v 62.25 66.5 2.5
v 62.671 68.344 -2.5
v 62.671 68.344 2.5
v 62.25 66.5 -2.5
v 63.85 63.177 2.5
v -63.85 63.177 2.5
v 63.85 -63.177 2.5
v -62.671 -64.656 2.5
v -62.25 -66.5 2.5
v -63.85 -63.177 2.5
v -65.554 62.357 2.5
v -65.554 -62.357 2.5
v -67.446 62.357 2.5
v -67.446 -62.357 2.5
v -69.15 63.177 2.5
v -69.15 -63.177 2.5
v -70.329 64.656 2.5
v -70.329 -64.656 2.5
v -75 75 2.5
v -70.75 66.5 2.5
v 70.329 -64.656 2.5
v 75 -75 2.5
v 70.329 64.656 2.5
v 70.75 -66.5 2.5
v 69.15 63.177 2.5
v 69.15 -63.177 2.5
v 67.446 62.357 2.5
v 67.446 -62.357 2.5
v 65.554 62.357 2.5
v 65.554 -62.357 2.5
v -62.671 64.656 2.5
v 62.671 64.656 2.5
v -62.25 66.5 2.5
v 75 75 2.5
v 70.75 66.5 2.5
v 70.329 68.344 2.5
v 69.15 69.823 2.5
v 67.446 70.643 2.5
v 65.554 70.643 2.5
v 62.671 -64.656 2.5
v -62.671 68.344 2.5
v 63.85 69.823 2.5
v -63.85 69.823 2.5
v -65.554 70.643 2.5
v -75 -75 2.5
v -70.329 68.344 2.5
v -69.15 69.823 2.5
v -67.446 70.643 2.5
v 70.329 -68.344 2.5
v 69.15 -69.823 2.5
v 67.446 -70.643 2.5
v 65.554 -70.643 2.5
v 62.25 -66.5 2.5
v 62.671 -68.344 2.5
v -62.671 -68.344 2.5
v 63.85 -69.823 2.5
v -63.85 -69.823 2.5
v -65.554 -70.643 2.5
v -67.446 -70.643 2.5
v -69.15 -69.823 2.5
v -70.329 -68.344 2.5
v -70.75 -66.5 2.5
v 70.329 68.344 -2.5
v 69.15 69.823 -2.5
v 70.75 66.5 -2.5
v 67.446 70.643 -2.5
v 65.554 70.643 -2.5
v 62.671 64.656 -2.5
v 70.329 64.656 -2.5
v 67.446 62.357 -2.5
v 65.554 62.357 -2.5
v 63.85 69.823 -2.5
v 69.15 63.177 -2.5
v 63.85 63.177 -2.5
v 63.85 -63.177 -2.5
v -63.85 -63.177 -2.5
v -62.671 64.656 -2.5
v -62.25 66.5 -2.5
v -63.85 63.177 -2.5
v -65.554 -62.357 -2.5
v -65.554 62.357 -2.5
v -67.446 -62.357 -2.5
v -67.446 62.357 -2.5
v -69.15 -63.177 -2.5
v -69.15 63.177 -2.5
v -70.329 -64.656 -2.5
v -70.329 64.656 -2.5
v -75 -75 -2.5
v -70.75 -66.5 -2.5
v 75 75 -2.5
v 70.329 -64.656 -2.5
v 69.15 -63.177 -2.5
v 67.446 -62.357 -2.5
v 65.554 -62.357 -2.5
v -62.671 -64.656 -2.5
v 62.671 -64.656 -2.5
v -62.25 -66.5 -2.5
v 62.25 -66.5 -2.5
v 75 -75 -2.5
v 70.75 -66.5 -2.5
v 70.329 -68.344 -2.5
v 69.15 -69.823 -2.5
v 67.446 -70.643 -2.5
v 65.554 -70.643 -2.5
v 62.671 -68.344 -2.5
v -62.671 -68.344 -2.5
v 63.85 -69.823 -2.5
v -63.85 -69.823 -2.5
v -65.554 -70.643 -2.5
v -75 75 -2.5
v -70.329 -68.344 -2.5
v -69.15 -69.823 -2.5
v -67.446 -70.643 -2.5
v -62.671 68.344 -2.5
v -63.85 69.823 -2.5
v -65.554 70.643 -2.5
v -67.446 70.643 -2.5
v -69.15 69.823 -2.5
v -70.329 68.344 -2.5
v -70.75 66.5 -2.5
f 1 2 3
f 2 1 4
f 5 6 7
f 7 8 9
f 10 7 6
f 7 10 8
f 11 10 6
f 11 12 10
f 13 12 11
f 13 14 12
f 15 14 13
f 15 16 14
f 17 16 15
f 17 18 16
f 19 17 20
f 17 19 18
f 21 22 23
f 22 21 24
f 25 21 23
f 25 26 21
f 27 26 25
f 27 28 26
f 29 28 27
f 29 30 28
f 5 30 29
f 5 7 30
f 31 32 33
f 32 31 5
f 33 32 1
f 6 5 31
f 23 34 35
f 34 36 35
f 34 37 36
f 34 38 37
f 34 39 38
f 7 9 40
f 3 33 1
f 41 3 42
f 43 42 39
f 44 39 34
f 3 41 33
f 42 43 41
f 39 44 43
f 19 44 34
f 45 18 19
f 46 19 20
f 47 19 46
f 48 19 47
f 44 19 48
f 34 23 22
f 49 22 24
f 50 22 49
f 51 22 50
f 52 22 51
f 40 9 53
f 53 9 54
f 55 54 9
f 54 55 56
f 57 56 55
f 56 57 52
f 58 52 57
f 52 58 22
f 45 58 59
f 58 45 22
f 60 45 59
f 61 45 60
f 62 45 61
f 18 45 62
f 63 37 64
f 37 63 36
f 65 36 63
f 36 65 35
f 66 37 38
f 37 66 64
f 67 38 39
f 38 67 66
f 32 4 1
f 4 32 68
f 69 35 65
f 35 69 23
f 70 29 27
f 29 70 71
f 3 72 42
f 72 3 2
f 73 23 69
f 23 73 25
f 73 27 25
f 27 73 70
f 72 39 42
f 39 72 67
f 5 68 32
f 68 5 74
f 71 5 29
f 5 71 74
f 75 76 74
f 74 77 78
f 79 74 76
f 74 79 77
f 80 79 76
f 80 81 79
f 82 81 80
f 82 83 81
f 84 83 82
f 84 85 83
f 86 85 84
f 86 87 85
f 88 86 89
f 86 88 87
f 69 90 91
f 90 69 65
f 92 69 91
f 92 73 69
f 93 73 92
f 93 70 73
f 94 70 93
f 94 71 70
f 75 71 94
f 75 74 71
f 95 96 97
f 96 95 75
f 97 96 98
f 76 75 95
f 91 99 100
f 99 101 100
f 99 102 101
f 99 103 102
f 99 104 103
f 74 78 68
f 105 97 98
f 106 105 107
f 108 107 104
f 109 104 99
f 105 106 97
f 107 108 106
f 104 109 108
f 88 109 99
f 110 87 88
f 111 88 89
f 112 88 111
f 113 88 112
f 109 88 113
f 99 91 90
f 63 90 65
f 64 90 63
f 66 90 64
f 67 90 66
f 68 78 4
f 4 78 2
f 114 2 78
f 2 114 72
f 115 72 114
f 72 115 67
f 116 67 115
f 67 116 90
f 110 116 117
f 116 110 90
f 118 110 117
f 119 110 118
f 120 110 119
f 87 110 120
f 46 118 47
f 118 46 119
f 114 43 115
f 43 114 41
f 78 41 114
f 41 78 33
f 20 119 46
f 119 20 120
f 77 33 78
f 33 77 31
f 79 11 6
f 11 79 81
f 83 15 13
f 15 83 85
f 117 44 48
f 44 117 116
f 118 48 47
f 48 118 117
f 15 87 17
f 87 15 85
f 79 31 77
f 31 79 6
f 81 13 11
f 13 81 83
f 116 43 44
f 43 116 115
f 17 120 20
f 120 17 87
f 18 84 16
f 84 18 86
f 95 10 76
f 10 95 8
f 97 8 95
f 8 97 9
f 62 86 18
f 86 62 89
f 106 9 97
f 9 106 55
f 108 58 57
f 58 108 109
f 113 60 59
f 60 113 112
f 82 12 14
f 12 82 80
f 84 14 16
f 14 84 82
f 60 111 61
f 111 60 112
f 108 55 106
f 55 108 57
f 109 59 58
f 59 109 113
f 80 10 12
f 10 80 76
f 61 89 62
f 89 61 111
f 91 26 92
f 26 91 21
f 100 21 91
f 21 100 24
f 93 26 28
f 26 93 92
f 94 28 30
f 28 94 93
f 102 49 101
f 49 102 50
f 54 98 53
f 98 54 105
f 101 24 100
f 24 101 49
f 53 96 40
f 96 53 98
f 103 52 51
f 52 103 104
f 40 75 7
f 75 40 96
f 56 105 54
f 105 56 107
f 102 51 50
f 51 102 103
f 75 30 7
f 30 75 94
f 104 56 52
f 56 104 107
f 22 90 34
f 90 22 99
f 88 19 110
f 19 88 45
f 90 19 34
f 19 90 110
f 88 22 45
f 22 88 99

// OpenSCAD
// Generated by SolidPython 1.1.3 on 2024-01-09 11:18:42


difference() {
	cube(center = true, size = [150, 150, 5]);
	union() {
		translate(v = [66.5000000000, 66.5000000000]) {
			cylinder(center = true, h = 5, r = 4.2500000000);
		}
		translate(v = [-66.5000000000, 66.5000000000]) {
			cylinder(center = true, h = 5, r = 4.2500000000);
		}
		translate(v = [-66.5000000000, -66.5000000000]) {
			cylinder(center = true, h = 5, r = 4.2500000000);
		}
		translate(v = [66.5000000000, -66.5000000000]) {
			cylinder(center = true, h = 5, r = 4.2500000000);
		}
	}
}
/***********************************************
*********      SolidPython code:      **********
************************************************
 
import solid
import numpy as np
import numbers
import pudb
from solid.utils import *
import viewscad
import subprocess
import os
import os.path as osp
import math
import sys

chamfer_extrude=solid.import_scad("./chamfer_extrude.scad")
chamfer_extrude=chamfer_extrude.chamfer_extrude
r = viewscad.Renderer(width=800, height=800)

def debug(model,f_name,path="/home/ts/code/projects/mfd/designs/debug"):
    solid.scad_render_to_file(model,osp.join(path,f_name)+".scad")
#generate position list of wells using offset from center
wells_pos_from_center_4 = lambda offset: [[-offset,offset],
                                        [offset, offset],
                                        [-offset, -offset],
                                        [offset, -offset]]
wells_pos_from_center_2 = lambda offset: [[offset,0],
                                        [-offset,0]]

def make_well(dims,shape=None,height=None,dxf=False):
    def circle_cylinder():
        if dxf or (height is None):
            well = solid.circle(r=dims, segments=64)
        else:
            well = solid.cylinder(r=dims, h=height, segments=64, center = True)
        return well
    if dims is None:
        sys.exit("radius needs to be a number")
    if isinstance(dims, numbers.Number):
        well =circle_cylinder()
    elif len(dims)==1:
        if isinstance(dims[1], numbers.Number):
            well =circle_cylinder()
        else:
            sys.exit("radius needs to be a number")
    elif len(dims)==2:
        well = solid.square(dims,center = True)
    elif len(dims)==3:
        well = solid.cube(dims, center = True)
    return well

def wells_top_bottom(center_gap,device_dims=None,shape=None,height=None, positions = None, dxf = False,well_shape=None):
    if well_shape == None:
        well_shape = make_well(device_dims,shape=shape,height=height,dxf=dxf)
    wells = []
    if positions is None:
        offset = radius+radius/2.0
        positions = wells_pos_from_center_2(offset)
    if dxf or (height is None):
        height = 0
    for position in positions:
        if dxf:
            wells.append(solid.translate([position[0],position[1]])(well_shape))
        else:
            wells.append(solid.translate([position[0],position[1],height/2.0])(well_shape))
    return  union()(*wells)

#place wells in four corners 
def four_corner(radius,height=None, positions = None, dxf = False):
    #if well pos not specified set
    #to equally spaced by half radius
    if positions is None:
        offset = radius+radius/2.0
        positions = wells_pos_from_center_4(offset)
    if dxf or (height is None):
        height = 0
    #make wells at positions with specified radius and height
    wells = []
    for position in positions:
        #make circle if making dxf
        if dxf:
            well_shape = solid.circle(r=radius, segments=64)
            well_shape = solid.translate([position[0],position[1]])(well_shape)
        #if stl make cylinder
        else:
            well_shape = solid.cylinder(r=radius, h=height, segments=64, center = True)
            well_shape = solid.translate([position[0],position[1],height/2.0])(well_shape)
        wells.append(well_shape)
    return  union()(*wells)

#generate channels 
def make_channels(length,width,height=0,num_chans=1,max_chans=None,spacing=None, dxf = False,
                  rotate_channels=False):
    if dxf or (height is None):
        height = 0
    #if channel gap not defined, is equal to
    if spacing is None: spacing = width
    #calculate number of channels if fitting max num within given width
    if not max_chans is None:
        import math
        num_chans = math.floor((max_chans-spacing)/(width+spacing))
    #get total width of channel section  
    total_width = (width*num_chans)+(spacing*(num_chans-1))

    #make template channel
    #if rotate_channels: width, length = length, width
    if dxf:
        channel_t = solid.square([length,width],center = True)
    else:
        channel_t = solid.cube([length,width,height], center = True)

    #if number channels is even, offset the first channel to center its gap
    if num_chans % 2 == 0: centering = -(width/2.0+spacing/2.0)
    else: centering = 0
    #move template channel up to align bottom at z = 0 
    #and offset center if necessary
    if dxf:
        channel_t = solid.translate([0,centering])(channel_t)
    else:
        channel_t = solid.translate([0,centering,height/2.0])(channel_t)

    #if rotate_channels: length,width = width,length
    #start making the channels
    channels = []
    for i in range(num_chans):
        #if i=0 there is no translation
        #if i=1, we make the first channel adjacent to second
        direction = i

        #if i>=1, we add channels alternating left and right
        if i >= 1:
            direction = -(i/2.0)
            if i % 2 == 1: direction = (-direction)+0.5
                
        #make channel at right position and add it to channel list
        translation_coords = [0,direction*(width+spacing)]
        #if rotate_channels: translation_coords = [direction*(width+spacing),0]
        if dxf:
            channel = solid.translate(translation_coords)(channel_t)
        else:
            channel = solid.translate([*translation_coords,0])(channel_t)
        channels.append(channel)
    
    #group all channels as one object
    channels = union()(*channels)
    #compute the x,y,z dimensions in order to pass as arguments 
    #for construction of other parts of device (such as the chambers)
    measurements = {'x':(length/2.0,-length/2.0),
                    'y':(total_width/2.0,-total_width/2.0)}
    if not dxf:
        measurements['z'] = (height,0)
    if rotate_channels:
        channels = solid.rotate(90)(channels)
        measurements['x'],measurements['y']=measurements['y'],measurements['x']
    return channels,measurements

def make_chambers(msrs,height=None,extra=0,len_until=None,width=None, dxf = False):
    #computes x,y,z length
    total = lambda x : abs(x[0]) + abs(x[1])
    
    #if specific height if specified
    #otherwise use same height as channels
    if dxf:
        pass
    elif not height is None:
        msrs['z'] = (height,0)
    else:
        msrs['z'] = (0,0)
        
    #make copy of measurements from channels to modify chamber dimensions 
    #and add length to chambers as specified
    chamber_dims = msrs.copy()
    #calculate length of chamber to reach specified offset
    if not len_until is None:
        chamber_len = len_until-(msrs['x'][0])
    #or add specified length to channel length (if not specified, adds 0)
    else:
        chamber_len = msrs['x'][0]+extra
    #set the chamber length based 
    chamber_dims['x'] = (chamber_len/2.0,-(chamber_len/2.0))
    #compute final dimensions of chamber
    if not width is None:
        chamber_dims['y'] = (width/2.0,-width/2.0)
    chamber_dims = [total(size) for size in chamber_dims.values()]
        
    #calculate chamber translation offset to place adjacent to channels
    chamber_trslt = msrs['x'][0]+(chamber_len/2.0)
    #compute chamber translation coordinates to align with channels
    #x = 1 moves chamber above channels
    #x = -1 moves chamber below channels
    if dxf:
        trslt = lambda x : [x*(chamber_trslt),0]
    else:
        trslt = lambda x : [x*(chamber_trslt),0,msrs['z'][0]/2.0]
    
    #function to make chamber at top or at bottom 
    if dxf:
        move = lambda x : solid.translate(trslt(x))(solid.square(chamber_dims, center = True) )
    else:
        move = lambda x : solid.translate(trslt(x))(solid.cube(chamber_dims,center = True))
    #make top and bottom chambers and return them as grouped
    top = move(1)
    bottom = move(-1)
    #chambers=solid.rotate(90)(solid.union()(top,bottom))
    chambers=(solid.union()(top,bottom))

    return chambers

#create alignment features 
def alignment_features(unit,dims,grid_size, mask_size = None, alignment = "hollow", units_from_center = (2.5,2.5), corner_len=None):
    width = grid_size[0]*dims[0]
    length = grid_size[1]*dims[1]
    if mask_size is None and corner_len is None:
        corner_len = (dims[0] + dims[1]) /2 / 8
    corner = lambda thickness_div : solid.union()( solid.square([corner_len,corner_len/thickness_div],center=False), solid.square([corner_len/thickness_div,corner_len],center=False) )
    
    def make_full(thickness_div):
        thickness = corner_len/thickness_div
        tr = solid.translate([0, 0, 0 ])(solid.rotate(180)(corner(thickness_div)))
        tr = solid.translate([thickness/2,thickness/2,0])(tr)
        bl = solid.translate([0, 0, 0 ])(solid.rotate(0)(corner(thickness_div)))
        bl = solid.translate([-thickness/2,-thickness/2,0])(bl)
        return solid.union()(tr,bl)
    
    def make_hollow(thickness_div):
        thickness = corner_len/(thickness_div/2)
        inner = make_full(thickness_div)
        outer = make_full(thickness_div/2)
        hollow = outer - inner 
        return hollow
    
    center = (width /2 , length/2)
    mask_pos = lambda x,y : (center[0] + x*(float(units_from_center[0])*dims[0]), center[1] + y*(float(units_from_center[1])*dims[1]))
    positions = []
    positions.append(mask_pos(1,0))
    positions.append(mask_pos(0,1))
    positions.append(mask_pos(-1,0))
    positions.append(mask_pos(0,-1))
    make_mask = lambda mtype : make_hollow(8) if mtype == "hollow" else make_full(8)
    masks = [ solid.translate([*position,0])(make_mask(alignment)) for position in positions]
    
    solid.scad_render_to_file(solid.union()(*masks),"./designs/open_chamber/masks.scad")
    #return unit - solid.union()(*masks)
    return solid.union()(*masks,unit)

def create_outline(thickness, array, dims, grid_size,):
    width = grid_size[0]*dims[0] + thickness *2
    length = grid_size[1]*dims[1] + thickness *2
    outer = solid.translate([-thickness, -thickness,0])(solid.square([width, length]))
    return outer-array

def create_wall(wall_thickness, outline_thickness, dims, grid_size, wall_height = 2000, dxf = False):
    inner_width = grid_size[0]*dims[0] + outline_thickness *2
    inner_length = grid_size[1]*dims[1] + outline_thickness *2
    outer_width = inner_width + wall_thickness * 2
    outer_length = inner_length + wall_thickness * 2
    outer_pos_x = -outline_thickness-wall_thickness
    outer_pos_y = -outline_thickness-wall_thickness
    inner_pos_x = -outline_thickness
    inner_pos_y = -outline_thickness
    if dxf:
        inner_wall = solid.translate([inner_pos_x,
                                      inner_pos_y,
                                      0])(solid.square([inner_width, inner_length]))
        outer_wall = solid.translate([outer_pos_x,
                                      outer_pos_y,
                                      0])(solid.square([outer_width, outer_length]))

        return outer_wall-inner_wall
    else:
        inner_wall = solid.translate([inner_pos_x,
                                      inner_pos_y,
                                      0])(solid.cube([inner_width, inner_length,wall_height]))
        outer_wall = solid.translate([outer_pos_x,
                                      outer_pos_y,
                                      0])(solid.cube([outer_width, outer_length,wall_height]))

        return outer_wall-inner_wall, {'wall_height': wall_height,
                                       'wall_thickness': wall_thickness,
                                       'inner_width':inner_width,
                                       'inner_length': inner_length,
                                       'outer_width': outer_width,
                                       'outer_length': outer_length,
                                       'outer_pos_x' : outer_pos_x,
                                       'outer_pos_y' : outer_pos_y,
                                       'inner_pos_x' : inner_pos_x,
                                       'inner_pos_y' : inner_pos_y}

def create_thicker_wall(wall_thickness, outer_wall_offset, wall_dims, dims, grid_size, height_start = .2, height_end=2, dxf = False):
    addon_wall,thicker_wall_dims = create_wall(wall_thickness, outer_wall_offset, dims, grid_size, wall_height=height_end-height_start, dxf = False)
    addon_wall = solid.translate([0,0,height_start])(addon_wall)

    thicker_wall_dims['wall_height'] = height_end
    thicker_wall_dims['wall_thickness'] = wall_dims['wall_thickness'] + wall_thickness
    return addon_wall, thicker_wall_dims
 
def add_lock_to_wall(wall,wall_dims,y_offset = 0,cut_ratio=0.7,L_length=3, gap_ratio=0.05, axis="x",width_ratio=1/2):
    # Makes L shape
    def make_L(max_length,length_thickness,max_width,width_thickness,height,y_offset):
        length = solid.cube([max_length,length_thickness,height])
        width = solid.cube([width_thickness,max_width,height])
        width = solid.translate([max_length-(width_thickness),0,0])(width)
        L = solid.union()(width,length)
        debug(L,"L")
        if axis == "x":
            L = solid.rotate(-90)(L)
            L = solid.translate([0,max_length,0])(L)
        else:
            L = solid.rotate(-180)(L)
            L = solid.translate([max_length,max_width,0])(L)
        return solid.translate([0,0,y_offset])(L)
    
    lock_length = L_length
    lock_width = wall_dims['wall_thickness']*width_ratio
    lock_length_thickness = lock_width/2
    lock_width_thickness = lock_width/2
    L_lock = make_L(lock_length,lock_length_thickness,lock_width,lock_width_thickness, wall_dims['wall_height']-y_offset, y_offset)
    
    margin_space = lock_length - lock_length*(1-gap_ratio)
    key_length = lock_length-margin_space
    key_length_thickness = lock_length_thickness-(margin_space*2)
    key_width = lock_width-(margin_space*2)
    key_width_thickness = lock_width_thickness-(margin_space*2)
    L_key = make_L(key_length,key_length_thickness,key_width,key_width_thickness, wall_dims['wall_height']-y_offset, y_offset)
    L_key = solid.translate([margin_space,margin_space,0])(L_key)
    L = solid.union()(L_lock,L_key)
    debug(L,"L")
    
    #Make cube to be used as negative to split frame in a half
    #Can choose if making left or right negative, specify ratio of split
    def make_negative(right,cut_ratio):
        if axis == "x":
            if right:
                length = wall_dims['outer_length']*(1-cut_ratio)
                pos_x = wall_dims['outer_pos_x']+(wall_dims['outer_length']*cut_ratio)
            else:
                length = wall_dims['outer_length']*(cut_ratio)
                pos_x = wall_dims['outer_pos_x'] 
            negative = solid.cube([wall_dims['outer_width'],length, wall_dims['wall_height']])
            negative = solid.translate([wall_dims['outer_pos_y'],pos_x,0])(negative)
        else:
            if right:
                length = wall_dims['outer_width']*(1-cut_ratio)
                pos_x = wall_dims['outer_pos_y']+(wall_dims['outer_width']*cut_ratio)
            else:
                length = wall_dims['outer_width']*(cut_ratio)
                pos_x = wall_dims['outer_pos_y'] 
            negative = solid.cube([length,wall_dims['outer_length'], wall_dims['wall_height']])
            negative = solid.translate([pos_x,wall_dims['outer_pos_x'],0])(negative)
        return negative, pos_x, length 
                      
    #Make negatives
    negative_right, right_half_pos_x, right_half_length = make_negative(True,cut_ratio)
    negative_left, left_half_pos_x, right_half_length = make_negative(False,cut_ratio)
    #Make halves
    left_half = solid.difference()(wall,negative_right)
    right_half = solid.difference()(wall,negative_left)
    def place_L(L, L_length,L_width):
        #Place L on top wall       
        offset_to_center = (wall_dims['wall_thickness']-L_width)/2
        if axis == "x":
            y_pos_top = (wall_dims['outer_pos_y'] +
                    wall_dims['outer_width'] - 
                    L_width - offset_to_center)
            top_L = solid.translate([y_pos_top,
                                     right_half_pos_x-(L_length),
                                     0])(L)
            #Place L on bottom wall       
            y_pos_bottom = wall_dims['outer_pos_y']+offset_to_center
            bottom_L = solid.translate([y_pos_bottom,
                                        right_half_pos_x-L_length,
                                        0])(L)
        else:
            y_pos_top = (wall_dims['outer_pos_x'] +
                    wall_dims['outer_length'] -
                    (L_width+offset_to_center))
            top_L = solid.translate([right_half_pos_x-L_length,
                                     y_pos_top,
                                     0])(L)
            #Place L on bottom wall       
            y_pos_bottom = wall_dims['outer_pos_y']+offset_to_center
            bottom_L = solid.translate([right_half_pos_x-L_length,
                                        y_pos_bottom,
                                        0])(L)
        return bottom_L, top_L
    #Make complimentary L pieces through union and differences
    #Make Lock
    bottom_L_lock, top_L_lock = place_L(L_lock,L_length,lock_width)
    left_half = solid.difference()(left_half,bottom_L_lock)
    left_half = solid.difference()(left_half,top_L_lock)
    #Make Key
    bottom_L_key, top_L_key = place_L(L_key,L_length,lock_width)
    right_half = solid.union()(right_half,bottom_L_key)
    right_half = solid.union()(right_half,top_L_key)
    return left_half, right_half


#build a row x col grid of containment units
def make_unit_array(unit,dims,grid_size, dxf = False, alignment = None, mask_size = None,
                    units_from_center = None,alignment_offset=None, alignment_mark_size=1):
    units = []
    for col in range(grid_size[1]):
        for row in range(grid_size[0]):
            if dxf:
                units.append(solid.translate([row*dims[0],col*dims[1]])(unit))
            else:
                units.append(solid.translate([row*dims[0],col*dims[1],dims[2]/2.0])(unit))
    array = solid.union()(*units)
    if (not alignment is None) and dxf:
        if not alignment_offset is None:
            array = solid.translate([alignment_offset[0],alignment_offset[1]])(array)
        array = alignment_features(array,dims, grid_size, alignment = alignment, mask_size = None, units_from_center = units_from_center,corner_len=alignment_mark_size)
        if not alignment_offset is None:
            array = solid.translate([-alignment_offset[0],-alignment_offset[1]])(array)
    return array


def make_taylor(wells_pos = wells_pos_from_center_4(2.25), well_rad = 1.5 ,
                well_height = 2, chan_w = 0.01, chan_l = 1, chan_h = 0.010 ,
                chan_gap = 0.040, max_chans = None,num_chans=100, chamber_height  = 0.100,
                columns = 1, rows = 1, chamber_len_until=2.25, add_channels = True, add_wells = True, 
                add_chambers = True, save_path = "./", alignment = None, units_from_center = 2,
                mask_size = None, render_stl = False, outline_thickness = 0.050, dxf = True,
                wall_height = 15, wall_thickness = 0.95, casing_x=9, casing_y=9, casing_z=0,rotate_units=0):

    dims = [casing_x, casing_y, casing_z]
    wells = four_corner(well_rad,well_height, dxf = dxf, positions = wells_pos)
    debug(wells,"wells")
    channels, msrs = make_channels(chan_l,chan_w,chan_h,dxf=dxf, spacing = chan_gap, max_chans=max_chans,num_chans=num_chans)
    debug(channels,"channels")
    chambers = make_chambers(msrs,dxf = dxf, height=chamber_height,len_until=chamber_len_until)
    debug(chambers,"chambers")

    #add together and render
    device_parts = []
    if add_channels:
        device_parts.append(channels)
    if add_wells:
        device_parts.append(wells)
    if add_chambers:
        device_parts.append(chambers)
    device=union()(*device_parts)
    device = rotate(rotate_units)(device)

    device=solid.translate([dims[0]/2.0,dims[1]/2.0,0])(device)
    channels = rotate(rotate_units)(channels)
    channels=solid.translate([dims[0]/2,dims[1]/2,0])(channels)
    chambers_wells = union()(wells,chambers)
    chambers_wells = rotate(rotate_units)(chambers_wells)
    chambers_wells=solid.translate([dims[0]/2,dims[1]/2,0])(chambers_wells)

    file_name = str(rows)+'x'+str(columns)+'_units_'
    grid_size = [rows,columns]

    if alignment:
        alignment="full"
    device = make_unit_array(device,dims,grid_size, dxf=dxf, alignment = alignment,
                                 units_from_center = units_from_center)
    channels = make_unit_array(channels,dims,grid_size, dxf=dxf, alignment = alignment,
                                 units_from_center = units_from_center)
    if alignment=="full":
        alignment="hollow"

    chambers_wells = make_unit_array(chambers_wells,dims,grid_size, dxf=dxf, alignment = alignment,
                                 units_from_center =units_from_center)

    def save_model(model,prefix):
        model_fname = os.path.abspath(save_path+prefix+"_"+file_name+".scad")
        solid.scad_render_to_file(model,model_fname)
        return model_fname

    wells_fname = save_model(wells,"wells")
    channels_fname = save_model(channels,"channels")
    device_fname = save_model(device,"device")
    chambers_wells_fname = save_model(chambers_wells,"chambers_wells")
    return (chambers_wells,chambers_wells_fname), (channels,channels_fname), (device,device_fname)

def make_device(design='open',rows=8,columns=6,wells_pos = 4.5,well_offset=3.2, well_rad=3.2,well_height=0.1,
                chan_l=1,chan_w=0.01,chan_h=0.01,chan_gap=0.015,num_chans=101,dxf=True,save_path="./designs/open_chamber/",
                casing_x=9.0,casing_y=18.0,casing_z=0,rotate_units=90,units_from_center=(3,1),chamber_len_until=4.5,
                chamber_width=None,alignment=True, add_wells=True, add_channels=True,add_chambers=True,well_shape=None):

    dims = [casing_x, casing_y, casing_z]
    if design == "open":
        wells_pos=wells_pos_from_center_2(wells_pos)
        wells = wells_top_bottom(well_offset*2,device_dims=well_rad,height=well_height, dxf = dxf, positions = wells_pos,well_shape=well_shape)
    elif design == "closed":
        wells_pos=wells_pos_from_center_4(wells_pos)
        debug(wells,"wells")
        wells = four_corner(well_offset,well_height,device_dims=well_rad, dxf = dxf, positions = wells_pos)
    else:
        print(design+" is not a valid design.\n Choose valid design: 'open' or 'closed'")
        exit()
    wells = rotate(rotate_units)(wells)
    wells=solid.translate([dims[0]/2,dims[1]/2,0])(wells)
    debug(wells,"wells")

    channels, msrs = make_channels(chan_l,chan_w,chan_h,dxf=dxf, spacing = chan_gap, num_chans=num_chans,rotate_channels=False)
    channels = rotate(rotate_units)(channels)
    channels=solid.translate([dims[0]/2,dims[1]/2,0])(channels)

    chambers=make_chambers(msrs,height=None,extra=0,len_until=chamber_len_until, width=chamber_width,dxf = dxf)
    chambers = rotate(rotate_units)(chambers)
    chambers=solid.translate([dims[0]/2,dims[1]/2,0])(chambers)

    device_parts = []
    if add_channels:
        device_parts.append(channels)
    if add_wells:
        device_parts.append(wells)
    if add_chambers:
        device_parts.append(chambers)
    device = union()(*device_parts)
    #device = rotate(rotate_units)(device)
    #device=solid.translate([dims[0]/2.0,dims[1]/2.0,0])(device)

    chambers_wells = []
    if add_chambers:
        chambers_wells.append(chambers)
    if add_wells:
        chambers_wells.append(wells)
    chambers_wells = union()(*chambers_wells)
    #chambers_wells = union()(wells,chambers)
    #chambers_wells = rotate(rotate_units)(chambers_wells)
    #chambers_wells=solid.translate([dims[0]/2,dims[1]/2,0])(chambers_wells)

    file_name = str(rows)+'x'+str(columns)+'_units_'

    grid_size = [rows,columns]
    if alignment:
        alignment="full"
    device = make_unit_array(device,dims,grid_size, dxf=dxf, alignment = alignment,
                                 units_from_center = units_from_center)
    channels = make_unit_array(channels,dims,grid_size, dxf=dxf, alignment = alignment,
                                 units_from_center = units_from_center)
    if alignment=="full":
        alignment="hollow"

    chambers_wells = make_unit_array(chambers_wells,dims,grid_size, dxf=dxf, alignment = alignment,
                                 units_from_center =units_from_center)

    def save_model(model,prefix):
        model_fname = os.path.abspath(save_path+prefix+"_"+file_name+".scad")
        solid.scad_render_to_file(model,model_fname)
        return model_fname

    wells_fname = save_model(wells,"wells")
    channels_fname = save_model(channels,"channels")
    device_fname = save_model(device,"device")
    chambers_wells_fname = save_model(chambers_wells,"chambers_wells")
    return (chambers_wells,chambers_wells_fname), (channels,channels_fname), (device,device_fname)


def make_open_chamber(rows=8,columns=6,wells_pos = wells_pos_from_center_2(4.5), well_rad=3.2,well_height=0.1,
                      chan_l=1,chan_w=0.01,chan_h=0.01,chan_gap=0.015,num_chans=101,dxf=True,save_path="./designs/open_chamber/",
                      casing_x=9.0,casing_y=18.0,casing_z=0,rotate_units=90,units_from_center=(3,1),chamber_len_until=4.5,
                      chamber_width=None,alignment=True, add_wells=True, add_channels=True,add_chambers=True,well_shape=None):

    dims = [casing_x, casing_y, casing_z]
    wells = wells_top_bottom(well_rad,height=well_height, dxf = dxf, positions = wells_pos, well_shape=well_shape)
    channels, msrs = make_channels(chan_l,chan_w,chan_h,dxf=dxf, spacing = chan_gap, num_chans=num_chans,rotate_channels=False)
    chambers=make_chambers(msrs,height=None,extra=0,len_until=chamber_len_until, width=chamber_width,dxf = dxf)
    debug(chambers,"chambers")
    device_parts = []
    if add_channels:
        device_parts.append(channels)
    if add_wells:
        device_parts.append(wells)
    if add_chambers:
        device_parts.append(chambers)
    device = union()(*device_parts)
    device = rotate(rotate_units)(device)
    device=solid.translate([dims[0]/2.0,dims[1]/2.0,0])(device)
    channels = rotate(rotate_units)(channels)
    channels=solid.translate([dims[0]/2,dims[1]/2,0])(channels)
    chambers_wells = union()(wells,chambers)
    chambers_wells = rotate(rotate_units)(chambers_wells)
    chambers_wells=solid.translate([dims[0]/2,dims[1]/2,0])(chambers_wells)

    file_name = str(rows)+'x'+str(columns)+'_units_'

    grid_size = [rows,columns]
    if alignment:
        alignment="full"
    device = make_unit_array(device,dims,grid_size, dxf=dxf, alignment = alignment,
                                 units_from_center = units_from_center)
    channels = make_unit_array(channels,dims,grid_size, dxf=dxf, alignment = alignment,
                                 units_from_center = units_from_center)
    if alignment=="full":
        alignment="hollow"

    chambers_wells = make_unit_array(chambers_wells,dims,grid_size, dxf=dxf, alignment = alignment,
                                 units_from_center =units_from_center)

    def save_model(model,prefix):
        model_fname = os.path.abspath(save_path+prefix+"_"+file_name+".scad")
        solid.scad_render_to_file(model,model_fname)
        return model_fname

    wells_fname = save_model(wells,"wells")
    channels_fname = save_model(channels,"channels")
    device_fname = save_model(device,"device")
    chambers_wells_fname = save_model(chambers_wells,"chambers_wells")
    return (chambers_wells,chambers_wells_fname), (channels,channels_fname), (device,device_fname)

def to_dxf(scad_path):
    dxf_path = scad_path.replace(".scad",".dxf")
    subprocess.call(["openscad", "-o", dxf_path, scad_path])
    import ezdxf
    temp_dxf = ezdxf.readfile(dxf_path)
    temp_dxf.saveas(dxf_path)

#def make_walls(diameter,thickness,grid_size,dims,height=20,segments=256,make_inner=True):
#    wafer_wall_out = solid.cylinder(r=diameter/2,h=height, segments=segments)
#    wafer_wall_in = solid.cylinder(r=(diameter/2-thickness),h=height, segments=segments)
#    wafer_wall = solid.difference()(wafer_wall_out,wafer_wall_in)
#    wafer_wall = solid.translate([grid_size[1]*dims[1]/2.0,grid_size[0]*dims[0]/2.0])(wafer_wall)
#
#    vertical_wall_length = grid_size[1]*dims[1]
#    horizontal_wall_length = grid_size[0]*dims[0]
#    vertical_wall = solid.cube([vertical_wall_length,thickness,height],center = True)
#    vertical_wall = solid.translate([vertical_wall_length/2,0,height/2])(vertical_wall)
#    horizontal_wall = solid.cube([thickness,horizontal_wall_length,height],center = True)
#    horizontal_wall = solid.translate([0,vertical_wall_length/2,height/2])(horizontal_wall)
#    walls = []
#    walls.append(horizontal_wall)
#    walls.append(vertical_wall)
#    for col in range(grid_size[1]):
#        if col == grid_size[1]-1: 
#            walls.append(solid.translate([0,(col+1)*dims[1]])(vertical_wall))
#        elif col > 0 and col < grid_size[1]-1 and make_inner==True:
#            walls.append(solid.translate([0,(col+1)*dims[1]])(vertical_wall))
#    for row in range(grid_size[0]):
#        if row == grid_size[0]-1: 
#            walls.append(solid.translate([(row+1)*dims[0],0])(horizontal_wall))
#        elif row > 0 and row < grid_size[0]-1 and make_inner==True:
#            walls.append(solid.translate([(row+1)*dims[0],0])(horizontal_wall))
#    walls = union()(*walls)
#    wafer_walls = union()(walls,wafer_wall)
#    return walls,wafer_wall,wafer_walls

def make_walls(diameter,thickness,grid_size,dims,height=20,segments=256,make_inner=True,padx=0,pady=0):
    wafer_wall_out = solid.cylinder(r=diameter/2,h=height, segments=segments)
    wafer_wall_in = solid.cylinder(r=(diameter/2-thickness),h=height, segments=segments)
    wafer_wall = solid.difference()(wafer_wall_out,wafer_wall_in)
    wafer_wall = solid.translate([grid_size[1]*dims[1]/2.0,grid_size[0]*dims[0]/2.0])(wafer_wall)

    vertical_wall_length = grid_size[0]*dims[0]+padx
    horizontal_wall_length = grid_size[1]*dims[1]+pady
    vertical_wall = solid.cube([vertical_wall_length,thickness,height],center = True)
    vertical_wall = solid.translate([vertical_wall_length/2-pady/2,-padx/2,height/2])(vertical_wall)
    horizontal_wall = solid.cube([thickness,horizontal_wall_length,height],center = True)
    horizontal_wall = solid.translate([-pady/2,horizontal_wall_length/2-padx/2,height/2])(horizontal_wall)
    walls = []
    walls.append(horizontal_wall)
    walls.append(vertical_wall)
    for col in range(grid_size[1]):
        if col == grid_size[1]-1: 
            walls.append(solid.translate([0,(col+1)*dims[1]+pady])(vertical_wall))
        elif col > 0 and col < grid_size[1]-1 and make_inner==True:
            walls.append(solid.translate([0,(col+1)*dims[1]])(vertical_wall))
    for row in range(grid_size[0]):
        if row == grid_size[0]-1: 
            walls.append(solid.translate([(row+1)*dims[0]+padx,0])(horizontal_wall))
        elif row > 0 and row < grid_size[0]-1 and make_inner==True:
            walls.append(solid.translate([(row+1)*dims[0],0])(horizontal_wall))
    walls = union()(*walls)
    wafer_walls = union()(walls,wafer_wall)
    return walls,wafer_wall,wafer_walls

def save_model(model,base_path,base_name,dxf=True):
    if not os.path.exists(base_path):
        os.makedirs(base_path)
    dxf_path=osp.join(base_path,base_name+".scad")
    solid.scad_render_to_file(model,osp.join(dxf_path))
    if dxf:
        to_dxf(dxf_path)

def make_wafer(diameter,flat_len,thickness):
    wafer = solid.cylinder(r1=diameter/2,r2=diameter/2,h=thickness,segments=512,)()
    x_start_flat=(flat_len/2)
    y_start_flat = math.sqrt(((diameter/2)**2) - (x_start_flat**2) )
    height_delete_flat=diameter/2-y_start_flat
    flat_delete = solid.cube([flat_len,height_delete_flat,thickness],center=False)()
    flat_delete = solid.translate([-flat_len/2,y_start_flat,0])(flat_delete)
    wafer = solid.difference()(wafer,flat_delete)
    wafer = solid.rotate(90)(wafer)
    return wafer

def add_wafer_to_mask(wafer_size,flat_len,mask,grid_size,dims,wafer_line_thickness=0.1,outer_mask_thickness=5,alignment_offset=None):
    def make_wafer_mask(wafer_size,flat_len):
        wafer_mask = make_wafer(wafer_size,flat_len,1)
        wafer_mask = solid.projection()(wafer_mask)
        wafer_mask = solid.translate([grid_size[0]*dims[0]/2.0,grid_size[1]*dims[1]/2.0])(wafer_mask)
        if not alignment_offset is None:
            wafer_mask = solid.translate([-alignment_offset[0],-alignment_offset[1]])(wafer_mask)
        return wafer_mask

    inner_wafer_line_mask = make_wafer_mask(wafer_size-wafer_line_thickness/2,flat_len)
    outer_wafer_line_mask = make_wafer_mask(wafer_size+wafer_line_thickness/2,flat_len)
    outer_wafer_mask = make_wafer_mask(wafer_size+outer_mask_thickness,flat_len)
    outer_wafer_mask = solid.difference()(outer_wafer_mask,outer_wafer_line_mask)
    wafer_mask = solid.union()(outer_wafer_mask,inner_wafer_line_mask)

    return solid.difference()(wafer_mask,mask)

def make_posts(post_shape,post_height):
    posts = solid.linear_extrude(height=post_height)(post_shape)
    return posts

def make_wafer_empty(diameter,flat_len,thickness,margin,notch_len=20,notch_height=5,oversize=1.01):
    diameter*=oversize
    flat_len*=oversize
    wafer = make_wafer(diameter,flat_len,thickness)
    holder = solid.cylinder(r1=diameter/2+margin,r2=diameter/2+margin,h=thickness,segments=512)()
    holder = solid.difference()(holder,wafer)

    x_start_flat=(flat_len/2)
    y_start_flat = math.sqrt(((diameter/2)**2) - (x_start_flat**2) )
    height_delete_flat=diameter/2-y_start_flat
    notch = solid.cube([notch_len,notch_height,thickness],center=False)()
    notch = solid.translate([-notch_len/2,y_start_flat,0])(notch)
    notch = solid.rotate(90)(notch)
    return solid.difference()(holder,notch)

def wafer_print_calibration(diameter,thickness,height,z_offset):
    circles = []
    radii = []
    radii.append(diameter/2.0*0.8)
    radii.append(diameter/2.0*0.6)
    radii.append(diameter/2.0*0.4)
    radii.append(diameter/2.0*0.2)
    for radius in radii:
        inner = solid.cylinder(r1=radius-(thickness/2.0),r2=radius-(thickness/2.0),h=thickness,segments=512,)()
        outer = solid.cylinder(r1=radius+(thickness/2.0),r2=radius+(thickness/2.0),h=thickness,segments=512,)()
        diff = solid.difference()(outer,inner)
        circles.append(diff)
    circles = solid.union()(*circles)
    circles = solid.translate([0,0,z_offset])(circles)
    return circles

def make_rack(wells,dims,grid_size,alignment_offset,rack_x,rack_y,rack_thickness,bolt_width,add_bolts=True):

    #get X and Y dimensions of gride of pipette tips
    X_len = dims[0]*grid_size[0]
    Y_len = dims[1]*grid_size[1]
    #make rack
    rack = solid.cube([rack_x,rack_y,rack_thickness],center=True)

    if add_bolts:
    #add bolt holes
        bolt_hole=solid.cylinder(r=bolt_width/2,h=rack_thickness,center=True)()
        bolt_holes = []
        bolt_holes.append(solid.translate([rack_x/2-1.5*bolt_width,rack_y/2-1.5*bolt_width])(bolt_hole))
        bolt_holes.append(solid.translate([-rack_x/2+1.5*bolt_width,rack_y/2-1.5*bolt_width])(bolt_hole))
        bolt_holes.append(solid.translate([-rack_x/2+1.5*bolt_width,-rack_y/2+1.5*bolt_width])(bolt_hole))
        bolt_holes.append(solid.translate([rack_x/2-1.5*bolt_width,-rack_y/2+1.5*bolt_width])(bolt_hole))
        bolt_holes = solid.union()(*bolt_holes)
        rack=solid.difference()(rack,bolt_holes)
    rack_support = rack

    #center rack with pipette holes
    rack = solid.translate([0,0,rack_thickness/2])(rack)
    rack = solid.translate([X_len/2,Y_len/2])(rack)
    rack = solid.translate([-alignment_offset[0],-alignment_offset[1]])(rack)
    wells = solid.linear_extrude(height=rack_thickness)(wells)
    rack = solid.difference()(rack,wells)
    return rack, rack_support

def make_pillar(wells,dims,grid_size,alignment_offset,rack_x,rack_y,pillar_height,rack_thickness,bolt_width,add_bolts=True,taper_angle=1,bolt_position_corner=1.5):

    #get X and Y dimensions of gride of pipette tips
    X_len = dims[0]*grid_size[0]
    Y_len = dims[1]*grid_size[1]
    #make rack
    rack = solid.cube([rack_x,rack_y,rack_thickness],center=True)
    
    if add_bolts:
    #add bolt holes
        bolt_hole=solid.cylinder(r=bolt_width/2,h=rack_thickness,center=True)()
        bolt_holes = []
        bolt_holes.append(solid.translate([rack_x/2-bolt_position_corner*bolt_width,rack_y/2-bolt_position_corner*bolt_width])(bolt_hole))
        bolt_holes.append(solid.translate([-rack_x/2+bolt_position_corner*bolt_width,rack_y/2-bolt_position_corner*bolt_width])(bolt_hole))
        bolt_holes.append(solid.translate([-rack_x/2+bolt_position_corner*bolt_width,-rack_y/2+bolt_position_corner*bolt_width])(bolt_hole))
        bolt_holes.append(solid.translate([rack_x/2-bolt_position_corner*bolt_width,-rack_y/2+bolt_position_corner*bolt_width])(bolt_hole))
        bolt_holes = solid.union()(*bolt_holes)
        rack=solid.difference()(rack,bolt_holes)
    rack_support = rack

    #center rack with pipette holes
    #rack = solid.translate([0,0,-rack_thickness])(rack)
    rack = solid.translate([X_len/2,Y_len/2])(rack)
    rack = solid.translate([-alignment_offset[0],-alignment_offset[1]])(rack)
    if not taper_angle == 0:
        wells=chamfer_extrude(pillar_height,taper_angle,segments=20)(wells)
    else:
        wells = solid.linear_extrude(height=pillar_height)(wells)
    rack = solid.union()(rack,wells)
    return rack, rack_support

def deg_taper_len(height,deg):
    if not deg == 0:
        return height*math.tan(math.radians(deg))
    else:
        return 0

def make_outline(inner_dims,wall_thickness,grid_size,dims,alignment_offset):
    inner_dims=np.array(inner_dims)
    inner_outline=solid.square(inner_dims,center=True)
    outer_dims=inner_dims+wall_thickness
    outer_outline=solid.square(outer_dims,center=True)
    outline=solid.difference()(outer_outline,inner_outline)
    outline=solid.translate([grid_size[0]*dims[0]/2.0,grid_size[1]*dims[1]/2.0])(outline)
    return outline








 
 
************************************************/
